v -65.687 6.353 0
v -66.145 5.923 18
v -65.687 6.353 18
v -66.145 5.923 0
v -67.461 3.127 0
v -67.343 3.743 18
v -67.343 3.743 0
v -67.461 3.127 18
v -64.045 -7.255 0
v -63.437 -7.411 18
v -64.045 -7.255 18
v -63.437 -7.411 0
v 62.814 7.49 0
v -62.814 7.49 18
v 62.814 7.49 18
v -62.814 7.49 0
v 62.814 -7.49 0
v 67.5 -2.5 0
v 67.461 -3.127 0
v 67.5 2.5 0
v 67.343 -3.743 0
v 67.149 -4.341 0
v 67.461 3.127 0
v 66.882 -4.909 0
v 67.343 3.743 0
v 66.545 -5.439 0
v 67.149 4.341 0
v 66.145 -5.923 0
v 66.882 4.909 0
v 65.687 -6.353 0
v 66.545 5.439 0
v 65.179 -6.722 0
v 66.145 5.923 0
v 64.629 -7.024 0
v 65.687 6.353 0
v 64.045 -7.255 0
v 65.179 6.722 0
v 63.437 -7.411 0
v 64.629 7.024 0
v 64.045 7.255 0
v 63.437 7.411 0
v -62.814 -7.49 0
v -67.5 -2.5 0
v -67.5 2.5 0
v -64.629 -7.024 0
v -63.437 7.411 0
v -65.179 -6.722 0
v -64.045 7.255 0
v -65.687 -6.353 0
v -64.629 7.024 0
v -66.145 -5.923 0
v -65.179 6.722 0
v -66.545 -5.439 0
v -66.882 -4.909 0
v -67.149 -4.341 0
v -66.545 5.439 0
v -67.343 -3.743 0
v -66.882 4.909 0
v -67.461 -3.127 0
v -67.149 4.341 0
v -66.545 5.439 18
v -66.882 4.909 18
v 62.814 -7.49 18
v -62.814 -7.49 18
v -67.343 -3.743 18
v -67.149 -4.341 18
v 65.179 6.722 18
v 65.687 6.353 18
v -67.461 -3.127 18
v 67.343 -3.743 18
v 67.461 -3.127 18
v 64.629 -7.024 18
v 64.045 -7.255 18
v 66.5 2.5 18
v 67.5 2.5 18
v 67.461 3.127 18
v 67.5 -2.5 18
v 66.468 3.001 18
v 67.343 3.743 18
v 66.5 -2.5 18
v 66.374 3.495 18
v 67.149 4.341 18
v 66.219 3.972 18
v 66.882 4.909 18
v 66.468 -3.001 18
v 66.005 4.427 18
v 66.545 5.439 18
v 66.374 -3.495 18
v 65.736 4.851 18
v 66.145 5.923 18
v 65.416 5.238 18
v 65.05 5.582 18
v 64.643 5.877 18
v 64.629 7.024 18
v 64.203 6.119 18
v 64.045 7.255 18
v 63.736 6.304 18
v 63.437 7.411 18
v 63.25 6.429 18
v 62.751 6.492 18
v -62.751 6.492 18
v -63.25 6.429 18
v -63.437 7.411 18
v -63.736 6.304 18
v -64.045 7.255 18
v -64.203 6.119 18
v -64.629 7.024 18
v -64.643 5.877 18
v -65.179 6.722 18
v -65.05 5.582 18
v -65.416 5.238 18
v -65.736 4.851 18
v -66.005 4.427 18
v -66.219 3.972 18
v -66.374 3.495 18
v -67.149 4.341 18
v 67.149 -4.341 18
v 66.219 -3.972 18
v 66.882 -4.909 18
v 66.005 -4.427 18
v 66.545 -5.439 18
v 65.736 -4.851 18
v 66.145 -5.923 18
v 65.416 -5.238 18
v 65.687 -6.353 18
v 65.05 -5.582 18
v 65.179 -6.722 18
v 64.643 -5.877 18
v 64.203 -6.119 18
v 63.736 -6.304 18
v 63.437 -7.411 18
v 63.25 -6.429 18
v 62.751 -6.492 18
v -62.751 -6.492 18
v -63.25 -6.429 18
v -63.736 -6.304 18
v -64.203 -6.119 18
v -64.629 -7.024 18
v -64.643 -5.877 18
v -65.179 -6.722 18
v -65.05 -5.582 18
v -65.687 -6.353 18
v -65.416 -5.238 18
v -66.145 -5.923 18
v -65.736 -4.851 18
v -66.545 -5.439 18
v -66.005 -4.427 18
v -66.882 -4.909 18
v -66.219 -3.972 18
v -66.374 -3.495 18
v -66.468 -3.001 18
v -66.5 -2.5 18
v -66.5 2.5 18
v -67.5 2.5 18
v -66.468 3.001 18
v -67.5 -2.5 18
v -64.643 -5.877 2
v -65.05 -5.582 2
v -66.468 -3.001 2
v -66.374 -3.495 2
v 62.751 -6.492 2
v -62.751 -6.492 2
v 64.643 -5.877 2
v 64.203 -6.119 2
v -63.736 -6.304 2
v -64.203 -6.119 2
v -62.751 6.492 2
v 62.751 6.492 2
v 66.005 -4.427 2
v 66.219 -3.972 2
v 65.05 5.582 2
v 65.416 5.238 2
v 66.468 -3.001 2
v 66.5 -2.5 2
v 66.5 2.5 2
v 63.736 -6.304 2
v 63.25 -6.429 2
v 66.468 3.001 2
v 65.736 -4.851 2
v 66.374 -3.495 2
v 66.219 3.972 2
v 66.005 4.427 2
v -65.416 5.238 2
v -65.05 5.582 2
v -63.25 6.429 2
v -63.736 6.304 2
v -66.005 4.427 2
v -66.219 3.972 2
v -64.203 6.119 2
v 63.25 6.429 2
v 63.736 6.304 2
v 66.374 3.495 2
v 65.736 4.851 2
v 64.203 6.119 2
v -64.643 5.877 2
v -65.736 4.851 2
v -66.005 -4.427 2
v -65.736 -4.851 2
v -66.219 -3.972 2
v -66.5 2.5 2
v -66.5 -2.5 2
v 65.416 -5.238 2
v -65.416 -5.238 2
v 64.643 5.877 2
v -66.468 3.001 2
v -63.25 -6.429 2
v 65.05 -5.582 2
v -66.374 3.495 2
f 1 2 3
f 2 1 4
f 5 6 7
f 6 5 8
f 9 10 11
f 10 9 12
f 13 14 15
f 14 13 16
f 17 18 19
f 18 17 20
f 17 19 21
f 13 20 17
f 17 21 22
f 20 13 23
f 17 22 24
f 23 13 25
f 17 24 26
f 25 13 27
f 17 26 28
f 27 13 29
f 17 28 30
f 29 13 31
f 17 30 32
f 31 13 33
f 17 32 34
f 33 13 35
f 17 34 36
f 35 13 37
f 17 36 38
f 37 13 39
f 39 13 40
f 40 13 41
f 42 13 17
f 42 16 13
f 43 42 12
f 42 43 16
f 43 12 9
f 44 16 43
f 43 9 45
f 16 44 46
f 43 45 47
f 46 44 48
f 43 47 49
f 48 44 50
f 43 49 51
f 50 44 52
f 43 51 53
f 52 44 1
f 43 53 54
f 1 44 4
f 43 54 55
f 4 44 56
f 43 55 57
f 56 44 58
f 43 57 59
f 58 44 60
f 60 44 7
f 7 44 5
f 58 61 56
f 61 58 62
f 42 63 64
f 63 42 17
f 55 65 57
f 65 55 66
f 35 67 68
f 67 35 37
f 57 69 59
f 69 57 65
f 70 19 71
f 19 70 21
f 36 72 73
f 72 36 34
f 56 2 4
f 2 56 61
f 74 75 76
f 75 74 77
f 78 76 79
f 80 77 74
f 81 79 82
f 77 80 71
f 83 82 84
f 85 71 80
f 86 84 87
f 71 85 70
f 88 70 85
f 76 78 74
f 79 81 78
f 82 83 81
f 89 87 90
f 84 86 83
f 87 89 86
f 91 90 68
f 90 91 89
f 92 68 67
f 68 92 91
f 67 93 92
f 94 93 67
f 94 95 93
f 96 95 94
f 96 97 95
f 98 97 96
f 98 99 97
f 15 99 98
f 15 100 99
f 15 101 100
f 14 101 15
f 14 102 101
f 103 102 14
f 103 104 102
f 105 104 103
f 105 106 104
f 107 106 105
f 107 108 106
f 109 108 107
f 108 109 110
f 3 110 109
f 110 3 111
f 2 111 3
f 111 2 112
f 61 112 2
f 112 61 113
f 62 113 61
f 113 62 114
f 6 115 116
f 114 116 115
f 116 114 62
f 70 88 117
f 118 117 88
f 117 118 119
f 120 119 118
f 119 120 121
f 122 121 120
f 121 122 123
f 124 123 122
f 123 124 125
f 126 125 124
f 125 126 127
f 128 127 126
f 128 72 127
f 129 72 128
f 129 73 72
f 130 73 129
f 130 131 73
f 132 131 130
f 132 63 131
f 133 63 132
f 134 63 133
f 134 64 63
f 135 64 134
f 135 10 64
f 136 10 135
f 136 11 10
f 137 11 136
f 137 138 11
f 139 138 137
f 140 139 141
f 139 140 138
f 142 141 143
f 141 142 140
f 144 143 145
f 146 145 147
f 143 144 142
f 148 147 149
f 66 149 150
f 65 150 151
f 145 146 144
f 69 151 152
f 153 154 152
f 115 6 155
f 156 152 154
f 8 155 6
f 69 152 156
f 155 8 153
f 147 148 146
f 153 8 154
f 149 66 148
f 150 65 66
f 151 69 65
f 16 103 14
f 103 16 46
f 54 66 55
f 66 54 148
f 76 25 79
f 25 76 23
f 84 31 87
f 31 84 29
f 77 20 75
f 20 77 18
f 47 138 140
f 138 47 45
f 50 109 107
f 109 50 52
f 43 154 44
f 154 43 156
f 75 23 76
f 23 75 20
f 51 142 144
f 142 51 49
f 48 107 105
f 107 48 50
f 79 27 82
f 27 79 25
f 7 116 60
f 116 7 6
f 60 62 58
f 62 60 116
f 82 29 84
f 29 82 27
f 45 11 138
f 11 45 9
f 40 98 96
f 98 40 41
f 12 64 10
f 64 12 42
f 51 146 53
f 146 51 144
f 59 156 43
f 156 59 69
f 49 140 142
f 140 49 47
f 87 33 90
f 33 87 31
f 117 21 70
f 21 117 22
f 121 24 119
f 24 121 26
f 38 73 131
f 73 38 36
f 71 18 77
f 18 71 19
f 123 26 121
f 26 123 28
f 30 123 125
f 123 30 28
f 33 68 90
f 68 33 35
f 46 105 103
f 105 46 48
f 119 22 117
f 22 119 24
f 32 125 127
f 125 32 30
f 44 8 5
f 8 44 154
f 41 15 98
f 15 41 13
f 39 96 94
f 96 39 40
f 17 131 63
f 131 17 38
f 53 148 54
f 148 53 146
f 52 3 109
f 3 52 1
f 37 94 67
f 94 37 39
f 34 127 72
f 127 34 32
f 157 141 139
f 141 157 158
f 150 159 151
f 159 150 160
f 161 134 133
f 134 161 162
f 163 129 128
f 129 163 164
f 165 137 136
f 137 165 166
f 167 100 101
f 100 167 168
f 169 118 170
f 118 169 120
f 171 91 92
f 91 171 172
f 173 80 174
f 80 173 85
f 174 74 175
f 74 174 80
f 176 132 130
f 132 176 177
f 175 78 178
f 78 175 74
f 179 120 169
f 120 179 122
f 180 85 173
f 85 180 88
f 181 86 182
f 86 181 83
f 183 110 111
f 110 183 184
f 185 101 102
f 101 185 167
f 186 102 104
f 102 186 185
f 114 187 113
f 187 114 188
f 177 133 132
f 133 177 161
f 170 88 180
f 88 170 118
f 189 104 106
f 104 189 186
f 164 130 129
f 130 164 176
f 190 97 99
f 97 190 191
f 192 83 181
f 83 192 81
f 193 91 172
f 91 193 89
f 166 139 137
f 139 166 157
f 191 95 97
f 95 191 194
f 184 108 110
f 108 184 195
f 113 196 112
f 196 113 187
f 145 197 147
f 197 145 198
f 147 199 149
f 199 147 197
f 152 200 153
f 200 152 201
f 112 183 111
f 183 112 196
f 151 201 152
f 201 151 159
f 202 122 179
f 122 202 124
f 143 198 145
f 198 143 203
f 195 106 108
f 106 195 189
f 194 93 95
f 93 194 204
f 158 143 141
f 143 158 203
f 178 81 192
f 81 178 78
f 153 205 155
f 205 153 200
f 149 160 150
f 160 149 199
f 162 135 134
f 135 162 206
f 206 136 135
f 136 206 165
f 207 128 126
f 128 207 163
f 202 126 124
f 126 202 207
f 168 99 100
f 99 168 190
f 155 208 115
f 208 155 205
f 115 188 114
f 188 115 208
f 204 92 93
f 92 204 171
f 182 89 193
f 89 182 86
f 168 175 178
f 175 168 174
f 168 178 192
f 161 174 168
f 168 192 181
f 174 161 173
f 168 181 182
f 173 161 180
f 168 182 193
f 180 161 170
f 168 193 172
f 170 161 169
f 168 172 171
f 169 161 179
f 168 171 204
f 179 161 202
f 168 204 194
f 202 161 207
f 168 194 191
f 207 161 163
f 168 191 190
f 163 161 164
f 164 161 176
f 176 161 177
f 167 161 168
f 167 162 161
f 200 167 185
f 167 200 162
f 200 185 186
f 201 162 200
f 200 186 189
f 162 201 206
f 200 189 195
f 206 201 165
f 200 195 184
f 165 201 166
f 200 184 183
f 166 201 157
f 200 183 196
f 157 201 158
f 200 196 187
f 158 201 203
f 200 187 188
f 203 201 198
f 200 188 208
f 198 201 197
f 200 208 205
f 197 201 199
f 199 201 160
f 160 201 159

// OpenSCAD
$fn = 50;


difference() {
	union() {
		hull() {
			translate(v = [-62.5000000000, 2.5000000000, 0]) {
				cylinder(h = 18, r = 5);
			}
			translate(v = [62.5000000000, 2.5000000000, 0]) {
				cylinder(h = 18, r = 5);
			}
			translate(v = [-62.5000000000, -2.5000000000, 0]) {
				cylinder(h = 18, r = 5);
			}
			translate(v = [62.5000000000, -2.5000000000, 0]) {
				cylinder(h = 18, r = 5);
			}
		}
	}
	union() {
		translate(v = [0, 0, 2]) {
			hull() {
				translate(v = [-62.5000000000, 2.5000000000, 0]) {
					cylinder(h = 16, r = 4);
				}
				translate(v = [62.5000000000, 2.5000000000, 0]) {
					cylinder(h = 16, r = 4);
				}
				translate(v = [-62.5000000000, -2.5000000000, 0]) {
					cylinder(h = 16, r = 4);
				}
				translate(v = [62.5000000000, -2.5000000000, 0]) {
					cylinder(h = 16, r = 4);
				}
			}
		}
	}
}
